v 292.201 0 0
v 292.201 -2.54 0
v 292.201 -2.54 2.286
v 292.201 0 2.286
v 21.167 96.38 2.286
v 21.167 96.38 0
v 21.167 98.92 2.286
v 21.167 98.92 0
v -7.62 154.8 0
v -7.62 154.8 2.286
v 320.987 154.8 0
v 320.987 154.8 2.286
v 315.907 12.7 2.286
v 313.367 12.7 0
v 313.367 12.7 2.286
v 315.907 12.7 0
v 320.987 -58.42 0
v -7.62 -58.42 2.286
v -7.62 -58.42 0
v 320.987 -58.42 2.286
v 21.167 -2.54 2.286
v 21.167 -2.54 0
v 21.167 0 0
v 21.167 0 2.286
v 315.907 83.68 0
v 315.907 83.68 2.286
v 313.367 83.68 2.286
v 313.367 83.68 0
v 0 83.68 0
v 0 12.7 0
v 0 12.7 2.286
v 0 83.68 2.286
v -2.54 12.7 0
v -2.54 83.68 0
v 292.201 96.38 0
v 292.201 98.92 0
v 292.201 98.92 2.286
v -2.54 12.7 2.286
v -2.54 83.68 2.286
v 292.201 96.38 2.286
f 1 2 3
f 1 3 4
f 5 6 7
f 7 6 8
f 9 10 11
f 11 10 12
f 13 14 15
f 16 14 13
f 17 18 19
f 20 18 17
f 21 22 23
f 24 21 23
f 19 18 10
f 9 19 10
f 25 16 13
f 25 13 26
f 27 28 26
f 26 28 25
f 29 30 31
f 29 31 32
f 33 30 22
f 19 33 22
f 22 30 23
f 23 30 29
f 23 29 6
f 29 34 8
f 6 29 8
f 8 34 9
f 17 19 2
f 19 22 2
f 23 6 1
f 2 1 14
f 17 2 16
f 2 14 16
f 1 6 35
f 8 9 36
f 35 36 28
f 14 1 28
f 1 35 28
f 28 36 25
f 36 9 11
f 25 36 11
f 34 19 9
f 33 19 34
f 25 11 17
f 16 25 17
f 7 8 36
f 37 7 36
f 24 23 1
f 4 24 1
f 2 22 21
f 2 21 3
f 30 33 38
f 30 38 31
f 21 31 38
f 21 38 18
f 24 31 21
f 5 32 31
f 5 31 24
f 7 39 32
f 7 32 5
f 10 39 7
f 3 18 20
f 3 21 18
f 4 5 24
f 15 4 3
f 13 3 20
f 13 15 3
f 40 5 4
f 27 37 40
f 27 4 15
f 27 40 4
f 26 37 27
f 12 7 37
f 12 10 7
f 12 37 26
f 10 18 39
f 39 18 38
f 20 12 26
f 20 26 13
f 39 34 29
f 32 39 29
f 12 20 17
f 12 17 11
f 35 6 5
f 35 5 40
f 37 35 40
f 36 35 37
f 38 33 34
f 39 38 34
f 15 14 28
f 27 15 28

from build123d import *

# Parameters (mm, degrees)
SKETCH1_W           = 328.60742
SKETCH1_H           = 111.6203
SKETCH1_W_2         = 271.033754468
SKETCH1_H_2         = 2.54
SKETCH1_W_3         = 2.54
SKETCH1_H_3         = 70.9803
BOSS_EXTRUDE1_DEPTH = 2.286
SKETCH2_W           = 328.60742
SKETCH2_H           = 50.8
BOSS_EXTRUDE2_DEPTH = 2.286


with BuildPart() as part:
    # Sketch1 → Boss-Extrude1 (new body)
    with BuildSketch(Plane.XY):
        with Locations((156.68371, 48.19015)):
            Rectangle(SKETCH1_W, SKETCH1_H)
        with Locations((156.68371, 97.6503)):
            Rectangle(SKETCH1_W_2, SKETCH1_H_2, mode=Mode.SUBTRACT)
        with Locations((-1.27, 48.19015)):
            Rectangle(SKETCH1_W_3, SKETCH1_H_3, mode=Mode.SUBTRACT)
        with Locations((314.63742, 48.19015)):
            Rectangle(SKETCH1_W_3, SKETCH1_H_3, mode=Mode.SUBTRACT)
        with Locations((156.68371, -1.27)):
            Rectangle(SKETCH1_W_2, SKETCH1_H_2, mode=Mode.SUBTRACT)
    extrude(amount=BOSS_EXTRUDE1_DEPTH)

    # Sketch2 → Boss-Extrude2 (add, through all)
    with BuildSketch(Plane.XY.offset(2.286)):
        with Locations((156.68371, 129.4003)):
            Rectangle(SKETCH2_W, SKETCH2_H)
        with Locations((156.68371, -33.02)):
            Rectangle(SKETCH2_W, SKETCH2_H)
    extrude(amount=-BOSS_EXTRUDE2_DEPTH)


solid = part.part
